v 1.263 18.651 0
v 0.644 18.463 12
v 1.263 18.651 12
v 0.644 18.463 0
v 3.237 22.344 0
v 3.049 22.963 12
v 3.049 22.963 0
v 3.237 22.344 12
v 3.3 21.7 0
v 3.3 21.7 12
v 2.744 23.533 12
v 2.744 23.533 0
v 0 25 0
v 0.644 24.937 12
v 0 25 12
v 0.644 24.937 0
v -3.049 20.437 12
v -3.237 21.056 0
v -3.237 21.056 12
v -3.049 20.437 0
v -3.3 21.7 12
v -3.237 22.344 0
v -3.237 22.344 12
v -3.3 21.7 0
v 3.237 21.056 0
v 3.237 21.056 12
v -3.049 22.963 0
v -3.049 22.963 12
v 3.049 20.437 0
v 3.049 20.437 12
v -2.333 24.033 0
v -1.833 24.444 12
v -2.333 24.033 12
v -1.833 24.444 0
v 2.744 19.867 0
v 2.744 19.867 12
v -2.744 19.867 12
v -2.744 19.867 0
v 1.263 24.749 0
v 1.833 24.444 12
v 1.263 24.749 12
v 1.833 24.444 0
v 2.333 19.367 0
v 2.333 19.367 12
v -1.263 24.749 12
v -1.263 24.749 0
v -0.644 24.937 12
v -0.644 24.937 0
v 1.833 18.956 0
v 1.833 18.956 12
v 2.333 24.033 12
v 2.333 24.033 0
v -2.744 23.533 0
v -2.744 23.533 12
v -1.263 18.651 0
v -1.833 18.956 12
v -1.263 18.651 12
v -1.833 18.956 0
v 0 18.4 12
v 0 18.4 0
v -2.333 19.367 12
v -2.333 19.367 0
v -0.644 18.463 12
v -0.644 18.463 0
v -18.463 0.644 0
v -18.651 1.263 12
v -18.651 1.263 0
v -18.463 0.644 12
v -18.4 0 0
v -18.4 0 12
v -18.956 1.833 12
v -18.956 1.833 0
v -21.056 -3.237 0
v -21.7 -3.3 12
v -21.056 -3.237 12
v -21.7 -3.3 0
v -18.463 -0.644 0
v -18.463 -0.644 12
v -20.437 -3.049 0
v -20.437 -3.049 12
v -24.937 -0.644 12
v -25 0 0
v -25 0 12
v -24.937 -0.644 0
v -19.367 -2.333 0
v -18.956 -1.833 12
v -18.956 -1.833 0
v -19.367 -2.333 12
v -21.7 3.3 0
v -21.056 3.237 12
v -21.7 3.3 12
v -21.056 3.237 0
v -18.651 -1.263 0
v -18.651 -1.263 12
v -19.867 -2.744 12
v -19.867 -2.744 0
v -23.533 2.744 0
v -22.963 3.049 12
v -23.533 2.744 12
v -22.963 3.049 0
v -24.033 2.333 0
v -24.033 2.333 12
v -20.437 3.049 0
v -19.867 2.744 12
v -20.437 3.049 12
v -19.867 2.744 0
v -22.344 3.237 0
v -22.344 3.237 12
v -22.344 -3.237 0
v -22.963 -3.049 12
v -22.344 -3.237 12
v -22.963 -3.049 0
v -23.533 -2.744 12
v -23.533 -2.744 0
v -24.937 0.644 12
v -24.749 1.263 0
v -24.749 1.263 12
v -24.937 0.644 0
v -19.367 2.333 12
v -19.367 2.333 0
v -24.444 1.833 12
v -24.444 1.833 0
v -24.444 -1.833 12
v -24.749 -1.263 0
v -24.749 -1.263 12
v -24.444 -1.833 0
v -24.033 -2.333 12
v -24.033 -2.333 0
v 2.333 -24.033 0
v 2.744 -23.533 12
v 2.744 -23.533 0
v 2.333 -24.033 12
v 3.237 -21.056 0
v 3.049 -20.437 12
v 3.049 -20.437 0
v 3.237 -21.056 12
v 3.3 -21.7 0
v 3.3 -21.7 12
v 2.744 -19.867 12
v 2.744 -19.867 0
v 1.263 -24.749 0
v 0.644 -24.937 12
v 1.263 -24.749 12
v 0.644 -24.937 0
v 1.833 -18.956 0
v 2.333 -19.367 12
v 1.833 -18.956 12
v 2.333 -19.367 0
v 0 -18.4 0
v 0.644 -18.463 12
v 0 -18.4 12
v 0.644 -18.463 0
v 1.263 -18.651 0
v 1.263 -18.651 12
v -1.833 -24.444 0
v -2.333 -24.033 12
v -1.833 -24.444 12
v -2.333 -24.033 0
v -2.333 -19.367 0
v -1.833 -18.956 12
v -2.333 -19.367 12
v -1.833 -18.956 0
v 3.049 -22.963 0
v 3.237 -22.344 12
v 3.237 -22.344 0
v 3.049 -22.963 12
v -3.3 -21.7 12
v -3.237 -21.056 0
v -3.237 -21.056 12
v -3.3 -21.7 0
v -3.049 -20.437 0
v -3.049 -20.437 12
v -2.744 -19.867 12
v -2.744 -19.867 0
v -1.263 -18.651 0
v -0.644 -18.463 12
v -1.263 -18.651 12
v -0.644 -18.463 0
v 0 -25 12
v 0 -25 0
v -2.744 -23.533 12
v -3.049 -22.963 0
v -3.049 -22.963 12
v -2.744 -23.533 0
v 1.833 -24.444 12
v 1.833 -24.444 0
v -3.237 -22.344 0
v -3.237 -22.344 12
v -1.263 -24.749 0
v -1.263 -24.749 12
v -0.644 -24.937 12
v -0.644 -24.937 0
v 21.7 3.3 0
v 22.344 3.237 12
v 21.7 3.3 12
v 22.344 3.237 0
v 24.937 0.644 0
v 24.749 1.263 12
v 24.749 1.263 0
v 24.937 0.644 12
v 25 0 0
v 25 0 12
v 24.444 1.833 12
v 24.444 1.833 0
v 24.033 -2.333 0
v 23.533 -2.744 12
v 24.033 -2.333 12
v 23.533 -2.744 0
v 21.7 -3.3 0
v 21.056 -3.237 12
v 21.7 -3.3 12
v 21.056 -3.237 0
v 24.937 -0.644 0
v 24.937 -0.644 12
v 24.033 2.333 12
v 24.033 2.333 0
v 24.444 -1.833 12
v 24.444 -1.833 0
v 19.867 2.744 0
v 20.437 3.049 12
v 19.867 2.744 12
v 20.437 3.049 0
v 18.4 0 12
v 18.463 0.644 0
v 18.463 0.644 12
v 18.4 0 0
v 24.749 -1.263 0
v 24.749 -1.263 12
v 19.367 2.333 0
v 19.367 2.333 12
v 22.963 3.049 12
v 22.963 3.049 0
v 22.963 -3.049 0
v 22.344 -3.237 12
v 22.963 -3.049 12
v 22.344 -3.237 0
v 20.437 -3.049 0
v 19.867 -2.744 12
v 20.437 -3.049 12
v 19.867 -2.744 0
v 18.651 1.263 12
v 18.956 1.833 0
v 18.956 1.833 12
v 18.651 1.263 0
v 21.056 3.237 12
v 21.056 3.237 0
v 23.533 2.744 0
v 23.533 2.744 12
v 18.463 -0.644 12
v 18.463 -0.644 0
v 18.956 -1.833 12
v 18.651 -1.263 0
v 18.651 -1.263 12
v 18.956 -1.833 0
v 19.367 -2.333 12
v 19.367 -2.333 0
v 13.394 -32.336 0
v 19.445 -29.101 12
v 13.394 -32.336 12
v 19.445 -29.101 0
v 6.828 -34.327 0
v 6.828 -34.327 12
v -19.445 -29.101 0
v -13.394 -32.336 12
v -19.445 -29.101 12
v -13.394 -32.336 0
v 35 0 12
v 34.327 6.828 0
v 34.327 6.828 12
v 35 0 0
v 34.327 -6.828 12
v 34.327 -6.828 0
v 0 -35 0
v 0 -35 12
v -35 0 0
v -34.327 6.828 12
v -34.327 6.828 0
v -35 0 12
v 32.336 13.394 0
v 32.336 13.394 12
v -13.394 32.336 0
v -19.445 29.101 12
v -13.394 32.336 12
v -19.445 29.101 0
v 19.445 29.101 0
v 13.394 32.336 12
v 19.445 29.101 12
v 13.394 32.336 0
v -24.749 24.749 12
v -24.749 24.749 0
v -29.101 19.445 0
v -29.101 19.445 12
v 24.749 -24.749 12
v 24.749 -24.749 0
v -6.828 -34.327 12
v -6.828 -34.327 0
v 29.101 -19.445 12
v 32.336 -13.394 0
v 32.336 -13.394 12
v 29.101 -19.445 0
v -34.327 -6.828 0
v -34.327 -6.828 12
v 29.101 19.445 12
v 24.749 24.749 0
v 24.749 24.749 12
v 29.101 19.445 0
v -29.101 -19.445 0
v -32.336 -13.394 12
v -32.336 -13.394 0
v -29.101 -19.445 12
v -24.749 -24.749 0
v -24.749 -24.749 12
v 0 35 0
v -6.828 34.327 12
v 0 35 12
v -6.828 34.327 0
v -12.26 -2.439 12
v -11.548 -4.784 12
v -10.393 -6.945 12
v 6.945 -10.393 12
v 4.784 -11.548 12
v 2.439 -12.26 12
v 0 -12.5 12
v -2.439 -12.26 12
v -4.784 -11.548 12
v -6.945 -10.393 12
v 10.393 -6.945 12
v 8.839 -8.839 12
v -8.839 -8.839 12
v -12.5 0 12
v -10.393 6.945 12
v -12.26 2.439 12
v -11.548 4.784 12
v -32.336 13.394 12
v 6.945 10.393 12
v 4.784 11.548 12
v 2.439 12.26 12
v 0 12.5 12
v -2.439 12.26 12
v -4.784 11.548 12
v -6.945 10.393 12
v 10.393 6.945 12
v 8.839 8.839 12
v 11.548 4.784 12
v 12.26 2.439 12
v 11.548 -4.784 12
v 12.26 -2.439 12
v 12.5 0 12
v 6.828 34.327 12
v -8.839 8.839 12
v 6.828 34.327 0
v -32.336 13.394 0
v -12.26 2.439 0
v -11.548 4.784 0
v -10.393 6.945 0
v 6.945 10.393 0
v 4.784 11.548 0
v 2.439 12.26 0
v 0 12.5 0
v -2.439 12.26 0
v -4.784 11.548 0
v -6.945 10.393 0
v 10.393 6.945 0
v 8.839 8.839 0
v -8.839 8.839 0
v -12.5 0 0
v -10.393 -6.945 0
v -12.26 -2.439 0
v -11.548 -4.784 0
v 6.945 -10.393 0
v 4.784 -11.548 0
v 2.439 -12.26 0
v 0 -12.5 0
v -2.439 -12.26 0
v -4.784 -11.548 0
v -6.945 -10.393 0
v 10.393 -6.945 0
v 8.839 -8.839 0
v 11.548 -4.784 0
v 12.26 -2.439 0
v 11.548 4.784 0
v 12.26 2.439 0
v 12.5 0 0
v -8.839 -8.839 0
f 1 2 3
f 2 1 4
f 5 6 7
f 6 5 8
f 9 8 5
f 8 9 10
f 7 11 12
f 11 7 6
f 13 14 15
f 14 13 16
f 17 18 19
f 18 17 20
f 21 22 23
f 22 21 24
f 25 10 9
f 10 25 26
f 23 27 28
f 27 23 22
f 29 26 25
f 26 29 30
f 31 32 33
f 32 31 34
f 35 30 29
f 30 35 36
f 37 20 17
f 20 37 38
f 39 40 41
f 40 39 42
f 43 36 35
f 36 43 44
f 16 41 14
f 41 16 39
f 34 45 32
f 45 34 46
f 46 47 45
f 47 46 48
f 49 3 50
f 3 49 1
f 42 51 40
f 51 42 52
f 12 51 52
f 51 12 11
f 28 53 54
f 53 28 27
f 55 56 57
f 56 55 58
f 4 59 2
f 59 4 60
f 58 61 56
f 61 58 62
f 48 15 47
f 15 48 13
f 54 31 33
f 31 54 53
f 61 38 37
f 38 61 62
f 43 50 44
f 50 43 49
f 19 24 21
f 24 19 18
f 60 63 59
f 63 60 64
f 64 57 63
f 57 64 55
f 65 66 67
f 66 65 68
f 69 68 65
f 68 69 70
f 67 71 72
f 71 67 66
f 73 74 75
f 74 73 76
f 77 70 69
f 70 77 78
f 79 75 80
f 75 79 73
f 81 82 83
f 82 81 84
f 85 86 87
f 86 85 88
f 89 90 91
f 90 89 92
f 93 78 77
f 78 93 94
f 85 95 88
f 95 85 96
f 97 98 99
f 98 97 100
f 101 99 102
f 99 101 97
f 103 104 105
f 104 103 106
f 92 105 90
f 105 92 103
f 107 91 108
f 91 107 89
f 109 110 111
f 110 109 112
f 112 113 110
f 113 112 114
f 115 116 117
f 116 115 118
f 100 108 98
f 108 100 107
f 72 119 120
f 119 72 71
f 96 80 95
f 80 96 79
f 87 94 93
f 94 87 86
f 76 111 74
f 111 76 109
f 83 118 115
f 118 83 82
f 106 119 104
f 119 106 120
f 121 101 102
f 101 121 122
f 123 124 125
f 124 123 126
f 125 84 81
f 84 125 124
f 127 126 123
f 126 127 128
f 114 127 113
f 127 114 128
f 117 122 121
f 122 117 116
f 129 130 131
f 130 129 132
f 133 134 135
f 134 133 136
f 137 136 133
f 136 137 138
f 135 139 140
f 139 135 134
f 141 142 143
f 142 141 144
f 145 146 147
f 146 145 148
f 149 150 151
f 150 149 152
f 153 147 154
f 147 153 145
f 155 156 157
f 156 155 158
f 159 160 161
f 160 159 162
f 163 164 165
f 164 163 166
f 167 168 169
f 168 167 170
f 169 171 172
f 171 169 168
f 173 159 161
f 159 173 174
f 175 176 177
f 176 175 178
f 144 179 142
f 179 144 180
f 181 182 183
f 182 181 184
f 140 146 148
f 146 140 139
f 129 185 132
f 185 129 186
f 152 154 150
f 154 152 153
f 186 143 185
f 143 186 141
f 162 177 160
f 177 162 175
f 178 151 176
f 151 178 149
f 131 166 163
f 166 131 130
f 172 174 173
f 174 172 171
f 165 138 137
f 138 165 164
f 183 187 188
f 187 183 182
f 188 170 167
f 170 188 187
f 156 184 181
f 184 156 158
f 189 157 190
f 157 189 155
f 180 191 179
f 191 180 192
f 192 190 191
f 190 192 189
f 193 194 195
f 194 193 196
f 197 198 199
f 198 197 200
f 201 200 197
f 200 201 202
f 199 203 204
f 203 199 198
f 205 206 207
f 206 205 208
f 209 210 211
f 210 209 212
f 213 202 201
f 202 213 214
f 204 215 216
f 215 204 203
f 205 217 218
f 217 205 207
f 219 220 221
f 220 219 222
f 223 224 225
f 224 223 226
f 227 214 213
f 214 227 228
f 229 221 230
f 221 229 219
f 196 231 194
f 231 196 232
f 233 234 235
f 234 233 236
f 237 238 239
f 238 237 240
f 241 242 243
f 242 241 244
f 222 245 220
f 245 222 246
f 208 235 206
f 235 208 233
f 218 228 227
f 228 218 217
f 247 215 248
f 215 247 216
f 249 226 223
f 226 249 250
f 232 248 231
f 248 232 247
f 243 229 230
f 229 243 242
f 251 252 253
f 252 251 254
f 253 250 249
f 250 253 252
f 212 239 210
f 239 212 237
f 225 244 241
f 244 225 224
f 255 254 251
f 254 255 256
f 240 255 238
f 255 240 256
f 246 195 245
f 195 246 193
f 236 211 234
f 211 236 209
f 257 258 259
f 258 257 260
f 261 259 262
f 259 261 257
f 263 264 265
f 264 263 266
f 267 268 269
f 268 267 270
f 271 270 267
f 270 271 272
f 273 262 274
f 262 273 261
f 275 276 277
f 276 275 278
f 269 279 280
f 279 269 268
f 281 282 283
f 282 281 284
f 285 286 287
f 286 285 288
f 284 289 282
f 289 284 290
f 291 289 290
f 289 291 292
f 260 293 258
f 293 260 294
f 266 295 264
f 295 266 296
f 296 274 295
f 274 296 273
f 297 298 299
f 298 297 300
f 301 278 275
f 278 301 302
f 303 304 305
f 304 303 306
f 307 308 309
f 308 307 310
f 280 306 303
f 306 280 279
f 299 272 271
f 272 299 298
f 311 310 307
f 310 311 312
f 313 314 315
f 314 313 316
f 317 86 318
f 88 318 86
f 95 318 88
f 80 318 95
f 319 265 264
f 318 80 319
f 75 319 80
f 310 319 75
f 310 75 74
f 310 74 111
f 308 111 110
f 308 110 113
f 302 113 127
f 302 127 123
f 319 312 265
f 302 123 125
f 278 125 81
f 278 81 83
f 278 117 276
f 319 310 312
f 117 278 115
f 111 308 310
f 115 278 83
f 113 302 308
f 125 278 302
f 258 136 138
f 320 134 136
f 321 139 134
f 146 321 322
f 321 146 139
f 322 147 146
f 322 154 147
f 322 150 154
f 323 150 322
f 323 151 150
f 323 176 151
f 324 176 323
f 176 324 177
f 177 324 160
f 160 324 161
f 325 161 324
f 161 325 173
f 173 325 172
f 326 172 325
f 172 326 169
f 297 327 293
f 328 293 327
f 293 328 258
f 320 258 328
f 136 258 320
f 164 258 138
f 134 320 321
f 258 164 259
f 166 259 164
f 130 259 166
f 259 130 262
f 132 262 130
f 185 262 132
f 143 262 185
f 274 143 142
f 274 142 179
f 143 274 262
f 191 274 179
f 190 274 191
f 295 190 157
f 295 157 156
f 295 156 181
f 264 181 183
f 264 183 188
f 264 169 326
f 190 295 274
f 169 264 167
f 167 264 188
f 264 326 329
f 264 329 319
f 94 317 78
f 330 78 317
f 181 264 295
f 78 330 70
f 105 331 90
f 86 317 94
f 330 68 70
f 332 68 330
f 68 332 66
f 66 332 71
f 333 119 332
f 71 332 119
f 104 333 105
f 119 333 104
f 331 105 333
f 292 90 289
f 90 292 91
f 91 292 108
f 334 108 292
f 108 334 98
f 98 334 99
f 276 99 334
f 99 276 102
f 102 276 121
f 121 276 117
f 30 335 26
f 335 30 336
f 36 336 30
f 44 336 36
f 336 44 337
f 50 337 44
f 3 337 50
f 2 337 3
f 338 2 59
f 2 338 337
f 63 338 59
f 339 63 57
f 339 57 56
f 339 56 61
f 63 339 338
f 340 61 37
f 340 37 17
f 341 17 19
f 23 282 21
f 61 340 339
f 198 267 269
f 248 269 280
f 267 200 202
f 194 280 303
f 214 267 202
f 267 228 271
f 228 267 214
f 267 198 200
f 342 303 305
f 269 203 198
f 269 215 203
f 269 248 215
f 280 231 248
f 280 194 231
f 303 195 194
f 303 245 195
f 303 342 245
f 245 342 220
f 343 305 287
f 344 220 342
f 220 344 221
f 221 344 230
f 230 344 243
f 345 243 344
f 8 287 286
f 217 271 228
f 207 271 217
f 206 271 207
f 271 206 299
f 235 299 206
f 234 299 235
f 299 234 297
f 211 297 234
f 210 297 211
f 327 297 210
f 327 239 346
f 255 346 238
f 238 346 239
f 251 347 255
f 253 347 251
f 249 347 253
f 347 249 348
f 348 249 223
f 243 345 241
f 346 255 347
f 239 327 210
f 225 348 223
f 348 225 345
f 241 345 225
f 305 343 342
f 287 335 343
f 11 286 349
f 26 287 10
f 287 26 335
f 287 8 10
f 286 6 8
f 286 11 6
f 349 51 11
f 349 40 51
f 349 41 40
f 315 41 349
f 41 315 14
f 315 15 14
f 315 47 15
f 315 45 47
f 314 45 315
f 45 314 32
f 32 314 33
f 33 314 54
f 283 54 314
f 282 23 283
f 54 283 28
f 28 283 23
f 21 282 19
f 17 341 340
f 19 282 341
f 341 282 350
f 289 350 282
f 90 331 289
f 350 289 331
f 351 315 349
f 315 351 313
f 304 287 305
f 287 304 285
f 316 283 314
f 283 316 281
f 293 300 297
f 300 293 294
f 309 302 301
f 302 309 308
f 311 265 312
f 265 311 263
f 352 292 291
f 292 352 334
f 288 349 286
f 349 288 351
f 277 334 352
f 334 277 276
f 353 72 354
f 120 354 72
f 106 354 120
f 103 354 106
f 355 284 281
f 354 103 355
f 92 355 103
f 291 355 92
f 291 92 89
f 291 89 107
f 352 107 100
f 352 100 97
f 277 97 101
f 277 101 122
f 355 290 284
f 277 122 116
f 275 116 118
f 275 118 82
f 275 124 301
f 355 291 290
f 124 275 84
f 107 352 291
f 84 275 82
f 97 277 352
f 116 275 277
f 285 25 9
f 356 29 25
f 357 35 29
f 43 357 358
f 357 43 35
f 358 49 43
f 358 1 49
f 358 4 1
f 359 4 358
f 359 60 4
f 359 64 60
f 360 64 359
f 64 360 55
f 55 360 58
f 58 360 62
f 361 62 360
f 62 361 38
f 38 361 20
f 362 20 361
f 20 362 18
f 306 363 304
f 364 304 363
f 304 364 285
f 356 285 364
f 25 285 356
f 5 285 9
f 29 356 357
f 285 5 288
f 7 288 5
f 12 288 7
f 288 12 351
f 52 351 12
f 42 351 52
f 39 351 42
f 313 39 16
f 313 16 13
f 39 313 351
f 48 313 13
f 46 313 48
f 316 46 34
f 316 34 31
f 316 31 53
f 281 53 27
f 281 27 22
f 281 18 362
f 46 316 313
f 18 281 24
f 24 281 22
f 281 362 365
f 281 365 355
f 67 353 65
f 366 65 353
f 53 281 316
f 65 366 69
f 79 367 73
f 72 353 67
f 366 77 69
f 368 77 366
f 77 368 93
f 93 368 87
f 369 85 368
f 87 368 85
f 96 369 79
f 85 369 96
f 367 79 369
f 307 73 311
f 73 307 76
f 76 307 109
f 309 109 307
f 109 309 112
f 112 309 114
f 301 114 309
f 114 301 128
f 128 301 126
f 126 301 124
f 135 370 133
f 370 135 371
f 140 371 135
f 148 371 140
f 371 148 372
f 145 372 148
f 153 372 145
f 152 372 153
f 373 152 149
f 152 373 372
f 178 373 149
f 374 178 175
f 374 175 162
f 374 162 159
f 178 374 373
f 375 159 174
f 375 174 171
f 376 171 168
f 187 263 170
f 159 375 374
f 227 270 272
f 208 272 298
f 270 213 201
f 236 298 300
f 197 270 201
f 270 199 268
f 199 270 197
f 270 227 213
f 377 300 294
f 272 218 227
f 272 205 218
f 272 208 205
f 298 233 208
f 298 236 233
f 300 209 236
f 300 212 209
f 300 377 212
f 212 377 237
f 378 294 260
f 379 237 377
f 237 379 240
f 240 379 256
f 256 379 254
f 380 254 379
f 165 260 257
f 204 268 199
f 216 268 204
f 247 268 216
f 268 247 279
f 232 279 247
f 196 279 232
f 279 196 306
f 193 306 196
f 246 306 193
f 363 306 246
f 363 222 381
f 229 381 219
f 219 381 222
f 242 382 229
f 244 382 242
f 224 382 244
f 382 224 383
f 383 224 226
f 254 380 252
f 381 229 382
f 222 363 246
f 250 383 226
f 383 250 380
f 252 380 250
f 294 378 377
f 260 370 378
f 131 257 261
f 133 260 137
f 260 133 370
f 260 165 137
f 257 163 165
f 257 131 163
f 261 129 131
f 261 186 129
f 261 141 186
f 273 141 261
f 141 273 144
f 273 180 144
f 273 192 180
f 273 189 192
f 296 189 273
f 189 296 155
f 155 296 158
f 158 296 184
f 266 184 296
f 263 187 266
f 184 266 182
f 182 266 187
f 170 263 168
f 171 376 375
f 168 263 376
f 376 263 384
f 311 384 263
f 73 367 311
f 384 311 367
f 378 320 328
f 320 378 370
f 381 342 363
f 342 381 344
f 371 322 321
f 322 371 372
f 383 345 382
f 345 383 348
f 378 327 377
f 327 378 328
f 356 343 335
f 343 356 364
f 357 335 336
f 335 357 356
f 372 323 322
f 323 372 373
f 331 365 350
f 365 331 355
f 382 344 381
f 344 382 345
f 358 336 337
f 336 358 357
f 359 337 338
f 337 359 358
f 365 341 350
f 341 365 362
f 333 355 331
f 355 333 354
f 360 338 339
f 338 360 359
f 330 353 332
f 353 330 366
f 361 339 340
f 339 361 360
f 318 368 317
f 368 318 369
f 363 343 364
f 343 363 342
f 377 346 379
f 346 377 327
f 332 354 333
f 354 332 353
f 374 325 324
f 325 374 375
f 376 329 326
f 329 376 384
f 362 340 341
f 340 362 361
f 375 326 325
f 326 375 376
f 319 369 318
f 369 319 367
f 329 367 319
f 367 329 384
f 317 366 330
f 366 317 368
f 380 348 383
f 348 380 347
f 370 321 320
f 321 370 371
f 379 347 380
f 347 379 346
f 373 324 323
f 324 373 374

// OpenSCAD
$fn = 32;

// ----------------------------------------------------------------------
// Flange Ø70 x 12
// 4 holes on a Ø43.4 bolt circle, bolted joints
// ----------------------------------------------------------------------

// --- parameters (mm) ---
flange_d = 70;   // outside diameter of the flange
thickness = 12;  // flange thickness
holes = 4;       // number of bolt holes
pcd = 43.4;      // bolt circle diameter
start_deg = 90;  // angle of the first hole, from +X
hole_d = 6.6;    // bolt hole diameter
bore_d = 25;     // central through bore
hub_d = 33;      // hub outside diameter
hub_h = 0;       // hub height above the flange face (0 = no hub)

// --- derived feature positions (mm) ---
height = thickness + hub_h;  // = 12   overall height of the part
pcd_r = pcd / 2;             // = 21.7   bolt circle radius
hole_step = 360 / holes;     // = 90   angular pitch
feature_centers = [
  [pcd_r * cos(start_deg + 0 * hole_step), pcd_r * sin(start_deg + 0 * hole_step)],
  [pcd_r * cos(start_deg + 1 * hole_step), pcd_r * sin(start_deg + 1 * hole_step)],
  [pcd_r * cos(start_deg + 2 * hole_step), pcd_r * sin(start_deg + 2 * hole_step)],
  [pcd_r * cos(start_deg + 3 * hole_step), pcd_r * sin(start_deg + 3 * hole_step)]
];   // bolt hole centres on the pitch circle

// flange disc, every hole and the bore cut straight through
difference() {
  union() {
    cylinder(d = flange_d, h = thickness);
  }
  translate([0, 0, -1]) cylinder(d = bore_d, h = height + 2);  // bore, through
  for (centre = feature_centers)
    translate([centre[0], centre[1], -1]) cylinder(d = hole_d, h = thickness + 2);
}
